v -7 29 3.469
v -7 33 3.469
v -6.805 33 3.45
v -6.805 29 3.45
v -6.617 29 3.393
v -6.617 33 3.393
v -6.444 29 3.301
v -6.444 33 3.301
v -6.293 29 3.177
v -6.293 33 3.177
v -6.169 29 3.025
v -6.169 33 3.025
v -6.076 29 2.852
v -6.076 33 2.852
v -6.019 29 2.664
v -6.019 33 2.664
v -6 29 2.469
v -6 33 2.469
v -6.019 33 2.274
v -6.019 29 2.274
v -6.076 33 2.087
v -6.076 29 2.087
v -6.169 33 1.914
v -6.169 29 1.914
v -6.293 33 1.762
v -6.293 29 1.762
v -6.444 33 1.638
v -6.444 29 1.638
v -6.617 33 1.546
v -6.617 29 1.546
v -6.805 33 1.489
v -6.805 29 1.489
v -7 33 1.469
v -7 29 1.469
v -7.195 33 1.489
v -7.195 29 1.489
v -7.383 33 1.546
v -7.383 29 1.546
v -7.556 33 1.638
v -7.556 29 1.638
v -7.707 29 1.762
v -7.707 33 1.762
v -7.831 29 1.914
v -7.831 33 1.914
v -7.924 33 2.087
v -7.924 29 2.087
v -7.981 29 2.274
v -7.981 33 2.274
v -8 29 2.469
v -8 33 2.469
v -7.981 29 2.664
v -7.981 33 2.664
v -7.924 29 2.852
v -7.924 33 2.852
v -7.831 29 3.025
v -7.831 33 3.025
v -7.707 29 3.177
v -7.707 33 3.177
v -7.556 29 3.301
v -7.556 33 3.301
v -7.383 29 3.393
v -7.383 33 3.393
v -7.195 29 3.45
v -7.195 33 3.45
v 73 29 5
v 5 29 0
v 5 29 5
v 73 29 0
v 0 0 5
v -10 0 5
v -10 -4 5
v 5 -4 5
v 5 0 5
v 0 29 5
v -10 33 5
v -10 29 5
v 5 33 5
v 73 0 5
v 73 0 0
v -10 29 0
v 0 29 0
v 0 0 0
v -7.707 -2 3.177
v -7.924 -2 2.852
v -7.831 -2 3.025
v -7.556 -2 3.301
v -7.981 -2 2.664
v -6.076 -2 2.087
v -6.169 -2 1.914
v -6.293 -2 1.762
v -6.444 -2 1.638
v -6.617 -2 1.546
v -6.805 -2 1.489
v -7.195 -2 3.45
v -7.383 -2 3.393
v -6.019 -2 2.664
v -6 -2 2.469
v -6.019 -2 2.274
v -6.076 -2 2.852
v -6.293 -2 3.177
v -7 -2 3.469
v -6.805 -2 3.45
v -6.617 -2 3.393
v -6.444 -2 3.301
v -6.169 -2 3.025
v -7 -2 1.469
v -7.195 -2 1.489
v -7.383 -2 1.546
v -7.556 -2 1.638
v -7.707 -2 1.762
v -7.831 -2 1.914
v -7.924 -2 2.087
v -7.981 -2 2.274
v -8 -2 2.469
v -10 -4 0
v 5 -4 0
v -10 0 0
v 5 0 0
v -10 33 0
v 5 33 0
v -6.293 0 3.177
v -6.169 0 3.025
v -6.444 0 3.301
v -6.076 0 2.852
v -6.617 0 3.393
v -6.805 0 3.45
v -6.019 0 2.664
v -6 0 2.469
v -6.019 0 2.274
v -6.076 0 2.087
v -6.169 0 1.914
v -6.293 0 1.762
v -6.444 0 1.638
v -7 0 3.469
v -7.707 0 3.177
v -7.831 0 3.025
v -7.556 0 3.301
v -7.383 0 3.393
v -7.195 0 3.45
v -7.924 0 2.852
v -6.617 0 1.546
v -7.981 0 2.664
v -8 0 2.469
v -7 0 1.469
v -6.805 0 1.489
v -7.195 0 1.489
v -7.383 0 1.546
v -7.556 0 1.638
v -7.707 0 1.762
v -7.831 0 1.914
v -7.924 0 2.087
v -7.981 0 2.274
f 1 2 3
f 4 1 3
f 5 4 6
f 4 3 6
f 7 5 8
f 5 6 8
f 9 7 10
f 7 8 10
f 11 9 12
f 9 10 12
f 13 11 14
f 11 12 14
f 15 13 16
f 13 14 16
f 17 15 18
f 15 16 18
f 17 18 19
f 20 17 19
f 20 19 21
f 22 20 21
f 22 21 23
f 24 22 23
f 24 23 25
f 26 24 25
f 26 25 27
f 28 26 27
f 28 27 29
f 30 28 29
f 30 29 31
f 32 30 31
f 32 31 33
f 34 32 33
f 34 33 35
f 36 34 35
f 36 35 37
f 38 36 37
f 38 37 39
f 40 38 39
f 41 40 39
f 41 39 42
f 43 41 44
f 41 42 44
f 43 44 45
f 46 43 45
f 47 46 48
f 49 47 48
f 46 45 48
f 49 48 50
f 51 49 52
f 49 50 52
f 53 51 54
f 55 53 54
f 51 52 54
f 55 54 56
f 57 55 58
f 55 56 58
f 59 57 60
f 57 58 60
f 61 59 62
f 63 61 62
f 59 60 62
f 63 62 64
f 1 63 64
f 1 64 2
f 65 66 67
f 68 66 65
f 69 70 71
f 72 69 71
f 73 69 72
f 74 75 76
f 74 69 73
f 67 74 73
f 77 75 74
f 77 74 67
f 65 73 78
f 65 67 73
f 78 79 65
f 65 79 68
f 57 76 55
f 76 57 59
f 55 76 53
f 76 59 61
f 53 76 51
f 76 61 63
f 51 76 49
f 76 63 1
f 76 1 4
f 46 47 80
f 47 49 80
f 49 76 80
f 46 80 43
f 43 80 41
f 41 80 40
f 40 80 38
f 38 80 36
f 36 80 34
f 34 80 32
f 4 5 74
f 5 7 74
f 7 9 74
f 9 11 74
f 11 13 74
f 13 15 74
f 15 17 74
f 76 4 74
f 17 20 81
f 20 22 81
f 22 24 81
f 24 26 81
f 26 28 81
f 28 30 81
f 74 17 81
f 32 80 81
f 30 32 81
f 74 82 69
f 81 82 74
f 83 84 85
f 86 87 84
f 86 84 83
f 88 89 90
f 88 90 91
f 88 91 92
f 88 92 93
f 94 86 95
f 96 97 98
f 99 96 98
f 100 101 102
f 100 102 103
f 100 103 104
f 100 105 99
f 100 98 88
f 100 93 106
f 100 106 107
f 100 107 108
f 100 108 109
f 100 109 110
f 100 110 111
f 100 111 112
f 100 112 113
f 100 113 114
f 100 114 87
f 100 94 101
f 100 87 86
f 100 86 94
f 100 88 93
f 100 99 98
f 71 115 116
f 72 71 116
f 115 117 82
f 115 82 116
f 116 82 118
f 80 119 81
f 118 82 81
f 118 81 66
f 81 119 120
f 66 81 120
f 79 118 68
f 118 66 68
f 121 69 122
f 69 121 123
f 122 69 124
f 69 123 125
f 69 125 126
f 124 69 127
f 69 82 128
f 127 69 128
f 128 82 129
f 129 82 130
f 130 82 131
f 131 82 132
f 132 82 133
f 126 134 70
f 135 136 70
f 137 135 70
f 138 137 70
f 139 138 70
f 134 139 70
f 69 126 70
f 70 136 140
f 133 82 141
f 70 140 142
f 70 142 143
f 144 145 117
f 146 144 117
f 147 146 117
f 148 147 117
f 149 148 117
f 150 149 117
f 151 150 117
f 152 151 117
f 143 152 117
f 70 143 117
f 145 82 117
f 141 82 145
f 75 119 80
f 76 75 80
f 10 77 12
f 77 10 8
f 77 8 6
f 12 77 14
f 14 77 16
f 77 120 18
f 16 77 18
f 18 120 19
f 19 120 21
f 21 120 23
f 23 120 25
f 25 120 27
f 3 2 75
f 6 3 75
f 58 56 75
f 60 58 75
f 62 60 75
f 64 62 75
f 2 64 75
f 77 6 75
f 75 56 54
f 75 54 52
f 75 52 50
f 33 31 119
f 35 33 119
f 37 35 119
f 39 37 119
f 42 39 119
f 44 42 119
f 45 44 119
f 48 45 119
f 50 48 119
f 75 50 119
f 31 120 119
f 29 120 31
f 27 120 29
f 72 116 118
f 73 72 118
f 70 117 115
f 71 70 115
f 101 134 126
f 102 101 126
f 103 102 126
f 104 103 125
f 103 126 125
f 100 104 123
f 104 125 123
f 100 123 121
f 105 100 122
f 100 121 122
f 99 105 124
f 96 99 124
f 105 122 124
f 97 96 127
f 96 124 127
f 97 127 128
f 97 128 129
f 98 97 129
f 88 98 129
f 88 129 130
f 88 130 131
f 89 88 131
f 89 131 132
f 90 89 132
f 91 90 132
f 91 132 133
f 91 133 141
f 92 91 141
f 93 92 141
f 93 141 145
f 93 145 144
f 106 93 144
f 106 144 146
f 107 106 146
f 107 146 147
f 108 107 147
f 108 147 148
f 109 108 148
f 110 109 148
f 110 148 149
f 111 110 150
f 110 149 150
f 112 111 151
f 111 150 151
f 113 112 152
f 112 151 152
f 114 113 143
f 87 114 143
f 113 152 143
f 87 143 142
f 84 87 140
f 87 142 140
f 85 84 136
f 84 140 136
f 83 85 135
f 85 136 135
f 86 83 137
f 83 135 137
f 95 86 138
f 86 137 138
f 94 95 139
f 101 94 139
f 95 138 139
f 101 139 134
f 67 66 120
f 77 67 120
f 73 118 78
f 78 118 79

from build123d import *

# Parameters (mm, degrees)
SKETCH1_W           = 73
SKETCH1_H           = 29
BOSS_EXTRUDE1_DEPTH = 5
SKETCH2_R           = 1
CUT_EXTRUDE1_DEPTH  = 35


with BuildPart() as part:
    # Sketch1 → Boss-Extrude1 (new body)
    with BuildSketch(Plane.XY):
        with Locations((36.5, 14.5)):
            Rectangle(SKETCH1_W, SKETCH1_H)
        Polygon((-10, 29), (0, 29), (5, 29), (5, 33), (-10, 33), align=None)
        Polygon((5, 0), (0, 0), (-10, 0), (-10, -4), (5, -4), align=None)
    extrude(amount=BOSS_EXTRUDE1_DEPTH)

    # Sketch2 → Cut-Extrude1 (cut)
    with BuildSketch(Plane(origin=(0, 33, 0), x_dir=(1, 0, 0), z_dir=(0, 1, 0))):
        with Locations(Location((-7, -2.46940408, 0), (0, 0, 270))):
            Circle(SKETCH2_R)
    extrude(amount=-CUT_EXTRUDE1_DEPTH, mode=Mode.SUBTRACT)


solid = part.part
